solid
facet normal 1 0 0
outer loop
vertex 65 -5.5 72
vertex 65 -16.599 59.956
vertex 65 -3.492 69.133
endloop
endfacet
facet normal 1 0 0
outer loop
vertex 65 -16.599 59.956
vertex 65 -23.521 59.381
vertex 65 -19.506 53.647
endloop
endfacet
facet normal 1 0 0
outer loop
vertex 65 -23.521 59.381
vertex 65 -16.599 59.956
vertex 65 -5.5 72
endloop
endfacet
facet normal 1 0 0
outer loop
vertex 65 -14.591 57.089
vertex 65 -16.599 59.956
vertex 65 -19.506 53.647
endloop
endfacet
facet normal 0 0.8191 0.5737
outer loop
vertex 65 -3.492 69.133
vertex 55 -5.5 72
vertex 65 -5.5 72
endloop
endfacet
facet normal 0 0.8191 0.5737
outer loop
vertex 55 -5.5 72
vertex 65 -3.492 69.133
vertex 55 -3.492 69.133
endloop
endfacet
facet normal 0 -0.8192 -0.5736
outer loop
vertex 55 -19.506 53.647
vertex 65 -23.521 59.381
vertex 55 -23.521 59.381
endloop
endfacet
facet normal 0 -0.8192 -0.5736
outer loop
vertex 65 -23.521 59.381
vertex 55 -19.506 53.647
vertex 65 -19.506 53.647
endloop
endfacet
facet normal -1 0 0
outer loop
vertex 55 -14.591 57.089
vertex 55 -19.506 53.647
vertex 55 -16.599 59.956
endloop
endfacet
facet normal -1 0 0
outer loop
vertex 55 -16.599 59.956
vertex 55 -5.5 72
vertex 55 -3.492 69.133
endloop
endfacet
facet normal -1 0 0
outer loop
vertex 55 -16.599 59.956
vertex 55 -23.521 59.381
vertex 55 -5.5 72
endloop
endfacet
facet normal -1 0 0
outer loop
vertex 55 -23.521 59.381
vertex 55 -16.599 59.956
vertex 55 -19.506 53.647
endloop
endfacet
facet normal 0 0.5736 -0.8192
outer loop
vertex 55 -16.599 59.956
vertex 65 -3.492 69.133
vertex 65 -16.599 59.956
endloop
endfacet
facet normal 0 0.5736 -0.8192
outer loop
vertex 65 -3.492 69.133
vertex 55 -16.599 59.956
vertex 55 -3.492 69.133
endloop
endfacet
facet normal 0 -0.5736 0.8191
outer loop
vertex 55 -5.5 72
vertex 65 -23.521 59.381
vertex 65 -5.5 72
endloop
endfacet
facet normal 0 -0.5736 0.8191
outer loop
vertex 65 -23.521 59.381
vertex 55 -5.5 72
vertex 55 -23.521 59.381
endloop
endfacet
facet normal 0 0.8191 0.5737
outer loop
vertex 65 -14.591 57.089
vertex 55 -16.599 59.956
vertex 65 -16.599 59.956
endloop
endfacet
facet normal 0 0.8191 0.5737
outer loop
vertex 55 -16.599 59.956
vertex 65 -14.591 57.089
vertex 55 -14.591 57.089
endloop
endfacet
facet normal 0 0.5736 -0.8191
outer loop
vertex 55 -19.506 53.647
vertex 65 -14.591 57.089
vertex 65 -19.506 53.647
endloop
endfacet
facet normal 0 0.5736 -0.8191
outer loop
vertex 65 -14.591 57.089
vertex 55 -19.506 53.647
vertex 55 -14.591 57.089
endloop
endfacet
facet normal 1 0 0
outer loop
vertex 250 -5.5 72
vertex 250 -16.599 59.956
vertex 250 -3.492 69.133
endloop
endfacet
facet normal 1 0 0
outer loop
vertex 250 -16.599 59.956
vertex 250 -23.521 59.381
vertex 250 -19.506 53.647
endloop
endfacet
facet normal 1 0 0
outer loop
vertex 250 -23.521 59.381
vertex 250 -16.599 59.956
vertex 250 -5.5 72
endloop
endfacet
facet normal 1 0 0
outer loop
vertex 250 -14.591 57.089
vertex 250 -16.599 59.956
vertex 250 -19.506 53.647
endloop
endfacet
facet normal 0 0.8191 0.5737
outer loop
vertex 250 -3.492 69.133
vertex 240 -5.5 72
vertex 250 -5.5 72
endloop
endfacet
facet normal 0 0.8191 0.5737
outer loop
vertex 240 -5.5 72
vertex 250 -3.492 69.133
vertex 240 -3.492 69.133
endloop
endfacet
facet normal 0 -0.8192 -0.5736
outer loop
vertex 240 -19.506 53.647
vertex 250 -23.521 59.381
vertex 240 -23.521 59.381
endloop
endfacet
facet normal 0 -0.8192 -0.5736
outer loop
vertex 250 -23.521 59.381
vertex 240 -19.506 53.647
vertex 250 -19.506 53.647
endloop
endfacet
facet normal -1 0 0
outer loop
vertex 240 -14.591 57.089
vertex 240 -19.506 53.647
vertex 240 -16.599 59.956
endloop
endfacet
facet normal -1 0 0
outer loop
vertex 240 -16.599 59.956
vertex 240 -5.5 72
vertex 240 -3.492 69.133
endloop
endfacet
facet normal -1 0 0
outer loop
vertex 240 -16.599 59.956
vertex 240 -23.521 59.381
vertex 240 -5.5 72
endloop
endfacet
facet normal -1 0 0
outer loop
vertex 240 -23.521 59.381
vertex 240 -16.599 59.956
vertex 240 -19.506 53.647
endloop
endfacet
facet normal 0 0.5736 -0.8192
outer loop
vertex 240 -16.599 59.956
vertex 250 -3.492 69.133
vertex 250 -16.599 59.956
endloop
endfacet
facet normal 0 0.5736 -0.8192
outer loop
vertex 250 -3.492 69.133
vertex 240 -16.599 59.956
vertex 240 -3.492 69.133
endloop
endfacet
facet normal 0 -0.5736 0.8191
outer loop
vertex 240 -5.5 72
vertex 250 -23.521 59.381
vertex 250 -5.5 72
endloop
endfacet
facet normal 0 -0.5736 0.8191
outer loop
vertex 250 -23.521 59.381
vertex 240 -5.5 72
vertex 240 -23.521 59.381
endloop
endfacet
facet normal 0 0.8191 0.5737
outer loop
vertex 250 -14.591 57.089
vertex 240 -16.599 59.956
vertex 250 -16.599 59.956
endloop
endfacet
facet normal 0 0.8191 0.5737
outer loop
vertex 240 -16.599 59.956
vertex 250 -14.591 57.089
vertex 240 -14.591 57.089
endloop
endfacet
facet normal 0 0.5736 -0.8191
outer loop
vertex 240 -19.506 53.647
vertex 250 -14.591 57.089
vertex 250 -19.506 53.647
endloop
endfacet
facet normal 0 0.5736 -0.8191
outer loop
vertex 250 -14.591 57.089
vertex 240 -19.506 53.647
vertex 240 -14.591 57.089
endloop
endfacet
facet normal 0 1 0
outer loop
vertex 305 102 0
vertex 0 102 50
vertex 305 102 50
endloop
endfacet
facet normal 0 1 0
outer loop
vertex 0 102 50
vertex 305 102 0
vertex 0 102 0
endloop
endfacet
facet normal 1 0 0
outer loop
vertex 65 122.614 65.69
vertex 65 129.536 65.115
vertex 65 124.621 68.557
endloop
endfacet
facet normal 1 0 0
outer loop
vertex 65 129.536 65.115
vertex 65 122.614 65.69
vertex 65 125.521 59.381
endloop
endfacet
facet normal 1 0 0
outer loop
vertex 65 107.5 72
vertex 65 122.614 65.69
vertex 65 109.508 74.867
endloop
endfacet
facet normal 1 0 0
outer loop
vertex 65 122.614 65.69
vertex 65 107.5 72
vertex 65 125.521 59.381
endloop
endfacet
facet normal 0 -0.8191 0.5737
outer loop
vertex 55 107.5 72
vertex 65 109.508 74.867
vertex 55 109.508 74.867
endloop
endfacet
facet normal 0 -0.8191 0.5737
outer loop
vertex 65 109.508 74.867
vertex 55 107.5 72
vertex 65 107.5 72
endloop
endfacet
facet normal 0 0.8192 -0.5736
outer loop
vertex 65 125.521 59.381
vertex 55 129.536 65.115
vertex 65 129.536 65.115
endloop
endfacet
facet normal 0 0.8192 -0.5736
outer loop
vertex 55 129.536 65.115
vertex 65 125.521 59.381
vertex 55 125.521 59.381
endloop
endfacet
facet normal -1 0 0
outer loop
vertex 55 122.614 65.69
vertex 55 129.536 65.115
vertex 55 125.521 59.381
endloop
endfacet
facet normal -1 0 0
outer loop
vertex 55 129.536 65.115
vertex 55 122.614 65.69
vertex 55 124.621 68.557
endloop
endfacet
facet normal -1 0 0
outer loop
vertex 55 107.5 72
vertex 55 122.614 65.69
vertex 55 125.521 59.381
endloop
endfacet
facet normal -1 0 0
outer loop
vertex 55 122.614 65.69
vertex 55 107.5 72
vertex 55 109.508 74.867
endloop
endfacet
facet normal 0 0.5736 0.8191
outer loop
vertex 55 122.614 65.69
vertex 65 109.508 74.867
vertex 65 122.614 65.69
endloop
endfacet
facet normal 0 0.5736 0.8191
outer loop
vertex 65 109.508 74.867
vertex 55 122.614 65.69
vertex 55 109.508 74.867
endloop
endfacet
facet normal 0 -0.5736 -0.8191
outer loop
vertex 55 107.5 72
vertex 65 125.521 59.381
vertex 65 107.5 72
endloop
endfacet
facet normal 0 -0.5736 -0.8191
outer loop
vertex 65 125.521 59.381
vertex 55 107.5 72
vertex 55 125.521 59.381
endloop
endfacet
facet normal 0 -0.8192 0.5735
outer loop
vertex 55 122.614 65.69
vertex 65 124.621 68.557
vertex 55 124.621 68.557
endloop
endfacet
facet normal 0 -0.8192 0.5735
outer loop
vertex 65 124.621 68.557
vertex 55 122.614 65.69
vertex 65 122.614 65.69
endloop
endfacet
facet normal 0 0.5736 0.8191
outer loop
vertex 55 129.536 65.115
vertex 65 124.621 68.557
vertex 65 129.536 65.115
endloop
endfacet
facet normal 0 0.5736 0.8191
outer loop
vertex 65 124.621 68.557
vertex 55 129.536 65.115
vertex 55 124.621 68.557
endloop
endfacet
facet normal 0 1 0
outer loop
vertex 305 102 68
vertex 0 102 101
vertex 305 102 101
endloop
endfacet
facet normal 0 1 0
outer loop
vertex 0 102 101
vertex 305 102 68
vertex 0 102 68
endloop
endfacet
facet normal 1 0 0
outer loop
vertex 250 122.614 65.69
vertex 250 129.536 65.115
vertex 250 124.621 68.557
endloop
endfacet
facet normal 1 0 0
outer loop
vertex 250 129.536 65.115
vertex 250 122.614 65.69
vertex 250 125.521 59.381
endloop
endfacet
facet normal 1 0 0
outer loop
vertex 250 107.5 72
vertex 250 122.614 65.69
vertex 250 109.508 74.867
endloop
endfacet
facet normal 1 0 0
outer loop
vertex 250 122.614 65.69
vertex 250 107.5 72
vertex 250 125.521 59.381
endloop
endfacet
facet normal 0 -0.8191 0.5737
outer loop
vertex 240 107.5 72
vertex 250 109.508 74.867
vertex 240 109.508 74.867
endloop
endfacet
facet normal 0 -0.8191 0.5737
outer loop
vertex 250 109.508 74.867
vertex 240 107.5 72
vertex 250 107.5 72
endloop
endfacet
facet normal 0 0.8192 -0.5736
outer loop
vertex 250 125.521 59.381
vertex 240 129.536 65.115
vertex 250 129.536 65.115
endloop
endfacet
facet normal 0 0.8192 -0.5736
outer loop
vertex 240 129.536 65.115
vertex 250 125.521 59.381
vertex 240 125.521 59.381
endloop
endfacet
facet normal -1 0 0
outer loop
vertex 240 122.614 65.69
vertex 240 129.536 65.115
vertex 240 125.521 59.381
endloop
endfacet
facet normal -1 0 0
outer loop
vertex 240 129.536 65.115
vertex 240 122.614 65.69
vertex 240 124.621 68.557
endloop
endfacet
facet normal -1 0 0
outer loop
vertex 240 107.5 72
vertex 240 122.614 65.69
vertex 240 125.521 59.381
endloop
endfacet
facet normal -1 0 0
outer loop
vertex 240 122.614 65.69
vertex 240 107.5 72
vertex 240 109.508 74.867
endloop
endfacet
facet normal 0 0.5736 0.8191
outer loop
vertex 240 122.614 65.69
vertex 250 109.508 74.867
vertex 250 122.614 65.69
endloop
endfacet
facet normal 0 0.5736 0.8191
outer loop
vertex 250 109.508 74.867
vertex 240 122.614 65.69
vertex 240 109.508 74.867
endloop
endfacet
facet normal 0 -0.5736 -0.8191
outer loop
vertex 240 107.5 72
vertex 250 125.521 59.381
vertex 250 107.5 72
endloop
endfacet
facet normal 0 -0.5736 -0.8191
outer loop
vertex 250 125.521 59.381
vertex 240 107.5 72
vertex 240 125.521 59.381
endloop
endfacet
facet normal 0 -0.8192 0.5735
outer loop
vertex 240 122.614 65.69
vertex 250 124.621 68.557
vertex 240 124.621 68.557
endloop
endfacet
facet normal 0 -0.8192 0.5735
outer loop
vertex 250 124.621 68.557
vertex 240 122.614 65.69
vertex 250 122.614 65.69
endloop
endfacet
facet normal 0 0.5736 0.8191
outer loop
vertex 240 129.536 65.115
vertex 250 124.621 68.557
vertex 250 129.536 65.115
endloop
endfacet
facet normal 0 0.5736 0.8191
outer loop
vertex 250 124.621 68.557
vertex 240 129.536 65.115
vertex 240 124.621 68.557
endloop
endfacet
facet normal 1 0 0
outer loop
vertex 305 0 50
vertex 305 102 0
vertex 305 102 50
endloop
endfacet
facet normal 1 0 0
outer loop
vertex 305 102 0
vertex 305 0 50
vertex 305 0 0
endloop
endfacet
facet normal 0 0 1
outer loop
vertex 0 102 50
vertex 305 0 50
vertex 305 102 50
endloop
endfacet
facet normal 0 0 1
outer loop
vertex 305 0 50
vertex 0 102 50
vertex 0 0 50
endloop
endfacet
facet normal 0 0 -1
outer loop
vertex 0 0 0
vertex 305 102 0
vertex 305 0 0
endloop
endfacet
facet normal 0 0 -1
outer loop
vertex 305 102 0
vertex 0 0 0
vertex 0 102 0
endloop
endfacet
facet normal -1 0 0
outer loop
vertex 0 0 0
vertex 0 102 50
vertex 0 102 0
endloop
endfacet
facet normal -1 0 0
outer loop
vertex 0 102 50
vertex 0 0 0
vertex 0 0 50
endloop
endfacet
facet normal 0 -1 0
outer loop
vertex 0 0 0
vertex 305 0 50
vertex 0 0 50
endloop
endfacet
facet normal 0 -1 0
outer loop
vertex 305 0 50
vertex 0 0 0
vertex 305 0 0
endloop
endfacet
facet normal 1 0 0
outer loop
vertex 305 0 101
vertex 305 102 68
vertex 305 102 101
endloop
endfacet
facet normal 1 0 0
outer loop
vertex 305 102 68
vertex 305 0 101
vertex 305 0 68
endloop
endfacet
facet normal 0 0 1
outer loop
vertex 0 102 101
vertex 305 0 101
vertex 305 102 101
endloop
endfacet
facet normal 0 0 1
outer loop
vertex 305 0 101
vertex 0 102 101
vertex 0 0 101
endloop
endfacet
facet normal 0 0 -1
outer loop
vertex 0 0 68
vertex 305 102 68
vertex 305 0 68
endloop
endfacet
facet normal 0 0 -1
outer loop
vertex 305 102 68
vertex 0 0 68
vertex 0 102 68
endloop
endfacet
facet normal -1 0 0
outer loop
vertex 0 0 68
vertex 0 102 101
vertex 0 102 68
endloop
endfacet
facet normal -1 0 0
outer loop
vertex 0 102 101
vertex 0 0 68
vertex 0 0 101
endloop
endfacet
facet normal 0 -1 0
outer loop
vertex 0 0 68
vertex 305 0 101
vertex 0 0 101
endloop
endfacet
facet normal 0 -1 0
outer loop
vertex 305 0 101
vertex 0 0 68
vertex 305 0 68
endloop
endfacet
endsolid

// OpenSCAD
// 01_side_flip_latch.scad
// Small flip-over latch on each long side: a pivoting arm on the upper tray
// clips over a catch pin on the lower tray. Two latches per long face.
// Engage: rotate arm down over pin. Release: flip arm up past vertical.
// explode = 0 → engaged/closed, explode > 0 → open/separated view.

explode = 18; // 0=engaged, 18=exploded

lx = 305; ly = 102; lz_lo = 50; lz_hi = 33;
wall = 3;

color_lo  = [0.35, 0.55, 0.80, 1];
color_hi  = [0.55, 0.78, 0.95, 1];
color_lat = [0.90, 0.55, 0.10, 1];  // latch arm – orange
color_pin = [0.70, 0.70, 0.70, 1];  // catch pin – grey

module lower_tray() { color(color_lo) cube([lx, ly, lz_lo]); }
module upper_tray() {
    color(color_hi) translate([0, 0, lz_lo + explode]) cube([lx, ly, lz_hi]);
}

// ── Catch pin on the outside of the lower tray long wall ─────────────────────
pin_r   = 3.5;
pin_len = 8;
// Two pin positions along X per side
px_list  = [60, lx - 60];

module catch_pin(sy) {
    y_sign = (sy == 0) ? -1 : 1;
    for (px = px_list) {
        color(color_pin)
        translate([px, sy, lz_lo - 14])
            rotate([90, 0, 0])
                cylinder(r = pin_r, h = pin_len * y_sign, $fn=24);
    }
}

// ── Latch arm pivoting from the upper tray ───────────────────────────────────
arm_l  = 22;
arm_w  = 10;
arm_t  = 3.5;
hook_d = 6;   // hook tail that wraps under pin
hook_t = 3.5;
boss_r = 4;

module latch_arm(sy, px) {
    y_sign = (sy == 0) ? -1 : 1;
    uz = lz_lo + explode;
    piv_z = uz + 4;  // pivot just above mating face of upper tray

    // Open angle when exploded, closed (down) when engaged
    rot_ang = (explode > 0) ? 55 : 5;

    color(color_lat) {
        // Pivot boss on side wall of upper tray
        translate([px, sy, piv_z])
            rotate([90, 0, 0])
                cylinder(r = boss_r, h = 5 * y_sign, $fn=24);

        // Arm body + hook, rotated about pivot
        translate([px, sy + y_sign * 5.5, piv_z])
        rotate([y_sign * rot_ang, 0, 0])
        translate([0, 0, 0])
        union() {
            // Main flat arm going downward
            translate([-arm_w/2, 0, -arm_l])
                cube([arm_w, arm_t, arm_l]);
            // Hook tail curling inward under pin
            translate([-arm_w/2, 0, -arm_l])
                cube([arm_w, arm_t + hook_t, hook_d]);
        }
    }
}

// ── Assembly ──────────────────────────────────────────────────────────────────
lower_tray();
upper_tray();

for (sy = [0, ly]) {
    catch_pin(sy);
    for (px = px_list)
        latch_arm(sy, px);
}
